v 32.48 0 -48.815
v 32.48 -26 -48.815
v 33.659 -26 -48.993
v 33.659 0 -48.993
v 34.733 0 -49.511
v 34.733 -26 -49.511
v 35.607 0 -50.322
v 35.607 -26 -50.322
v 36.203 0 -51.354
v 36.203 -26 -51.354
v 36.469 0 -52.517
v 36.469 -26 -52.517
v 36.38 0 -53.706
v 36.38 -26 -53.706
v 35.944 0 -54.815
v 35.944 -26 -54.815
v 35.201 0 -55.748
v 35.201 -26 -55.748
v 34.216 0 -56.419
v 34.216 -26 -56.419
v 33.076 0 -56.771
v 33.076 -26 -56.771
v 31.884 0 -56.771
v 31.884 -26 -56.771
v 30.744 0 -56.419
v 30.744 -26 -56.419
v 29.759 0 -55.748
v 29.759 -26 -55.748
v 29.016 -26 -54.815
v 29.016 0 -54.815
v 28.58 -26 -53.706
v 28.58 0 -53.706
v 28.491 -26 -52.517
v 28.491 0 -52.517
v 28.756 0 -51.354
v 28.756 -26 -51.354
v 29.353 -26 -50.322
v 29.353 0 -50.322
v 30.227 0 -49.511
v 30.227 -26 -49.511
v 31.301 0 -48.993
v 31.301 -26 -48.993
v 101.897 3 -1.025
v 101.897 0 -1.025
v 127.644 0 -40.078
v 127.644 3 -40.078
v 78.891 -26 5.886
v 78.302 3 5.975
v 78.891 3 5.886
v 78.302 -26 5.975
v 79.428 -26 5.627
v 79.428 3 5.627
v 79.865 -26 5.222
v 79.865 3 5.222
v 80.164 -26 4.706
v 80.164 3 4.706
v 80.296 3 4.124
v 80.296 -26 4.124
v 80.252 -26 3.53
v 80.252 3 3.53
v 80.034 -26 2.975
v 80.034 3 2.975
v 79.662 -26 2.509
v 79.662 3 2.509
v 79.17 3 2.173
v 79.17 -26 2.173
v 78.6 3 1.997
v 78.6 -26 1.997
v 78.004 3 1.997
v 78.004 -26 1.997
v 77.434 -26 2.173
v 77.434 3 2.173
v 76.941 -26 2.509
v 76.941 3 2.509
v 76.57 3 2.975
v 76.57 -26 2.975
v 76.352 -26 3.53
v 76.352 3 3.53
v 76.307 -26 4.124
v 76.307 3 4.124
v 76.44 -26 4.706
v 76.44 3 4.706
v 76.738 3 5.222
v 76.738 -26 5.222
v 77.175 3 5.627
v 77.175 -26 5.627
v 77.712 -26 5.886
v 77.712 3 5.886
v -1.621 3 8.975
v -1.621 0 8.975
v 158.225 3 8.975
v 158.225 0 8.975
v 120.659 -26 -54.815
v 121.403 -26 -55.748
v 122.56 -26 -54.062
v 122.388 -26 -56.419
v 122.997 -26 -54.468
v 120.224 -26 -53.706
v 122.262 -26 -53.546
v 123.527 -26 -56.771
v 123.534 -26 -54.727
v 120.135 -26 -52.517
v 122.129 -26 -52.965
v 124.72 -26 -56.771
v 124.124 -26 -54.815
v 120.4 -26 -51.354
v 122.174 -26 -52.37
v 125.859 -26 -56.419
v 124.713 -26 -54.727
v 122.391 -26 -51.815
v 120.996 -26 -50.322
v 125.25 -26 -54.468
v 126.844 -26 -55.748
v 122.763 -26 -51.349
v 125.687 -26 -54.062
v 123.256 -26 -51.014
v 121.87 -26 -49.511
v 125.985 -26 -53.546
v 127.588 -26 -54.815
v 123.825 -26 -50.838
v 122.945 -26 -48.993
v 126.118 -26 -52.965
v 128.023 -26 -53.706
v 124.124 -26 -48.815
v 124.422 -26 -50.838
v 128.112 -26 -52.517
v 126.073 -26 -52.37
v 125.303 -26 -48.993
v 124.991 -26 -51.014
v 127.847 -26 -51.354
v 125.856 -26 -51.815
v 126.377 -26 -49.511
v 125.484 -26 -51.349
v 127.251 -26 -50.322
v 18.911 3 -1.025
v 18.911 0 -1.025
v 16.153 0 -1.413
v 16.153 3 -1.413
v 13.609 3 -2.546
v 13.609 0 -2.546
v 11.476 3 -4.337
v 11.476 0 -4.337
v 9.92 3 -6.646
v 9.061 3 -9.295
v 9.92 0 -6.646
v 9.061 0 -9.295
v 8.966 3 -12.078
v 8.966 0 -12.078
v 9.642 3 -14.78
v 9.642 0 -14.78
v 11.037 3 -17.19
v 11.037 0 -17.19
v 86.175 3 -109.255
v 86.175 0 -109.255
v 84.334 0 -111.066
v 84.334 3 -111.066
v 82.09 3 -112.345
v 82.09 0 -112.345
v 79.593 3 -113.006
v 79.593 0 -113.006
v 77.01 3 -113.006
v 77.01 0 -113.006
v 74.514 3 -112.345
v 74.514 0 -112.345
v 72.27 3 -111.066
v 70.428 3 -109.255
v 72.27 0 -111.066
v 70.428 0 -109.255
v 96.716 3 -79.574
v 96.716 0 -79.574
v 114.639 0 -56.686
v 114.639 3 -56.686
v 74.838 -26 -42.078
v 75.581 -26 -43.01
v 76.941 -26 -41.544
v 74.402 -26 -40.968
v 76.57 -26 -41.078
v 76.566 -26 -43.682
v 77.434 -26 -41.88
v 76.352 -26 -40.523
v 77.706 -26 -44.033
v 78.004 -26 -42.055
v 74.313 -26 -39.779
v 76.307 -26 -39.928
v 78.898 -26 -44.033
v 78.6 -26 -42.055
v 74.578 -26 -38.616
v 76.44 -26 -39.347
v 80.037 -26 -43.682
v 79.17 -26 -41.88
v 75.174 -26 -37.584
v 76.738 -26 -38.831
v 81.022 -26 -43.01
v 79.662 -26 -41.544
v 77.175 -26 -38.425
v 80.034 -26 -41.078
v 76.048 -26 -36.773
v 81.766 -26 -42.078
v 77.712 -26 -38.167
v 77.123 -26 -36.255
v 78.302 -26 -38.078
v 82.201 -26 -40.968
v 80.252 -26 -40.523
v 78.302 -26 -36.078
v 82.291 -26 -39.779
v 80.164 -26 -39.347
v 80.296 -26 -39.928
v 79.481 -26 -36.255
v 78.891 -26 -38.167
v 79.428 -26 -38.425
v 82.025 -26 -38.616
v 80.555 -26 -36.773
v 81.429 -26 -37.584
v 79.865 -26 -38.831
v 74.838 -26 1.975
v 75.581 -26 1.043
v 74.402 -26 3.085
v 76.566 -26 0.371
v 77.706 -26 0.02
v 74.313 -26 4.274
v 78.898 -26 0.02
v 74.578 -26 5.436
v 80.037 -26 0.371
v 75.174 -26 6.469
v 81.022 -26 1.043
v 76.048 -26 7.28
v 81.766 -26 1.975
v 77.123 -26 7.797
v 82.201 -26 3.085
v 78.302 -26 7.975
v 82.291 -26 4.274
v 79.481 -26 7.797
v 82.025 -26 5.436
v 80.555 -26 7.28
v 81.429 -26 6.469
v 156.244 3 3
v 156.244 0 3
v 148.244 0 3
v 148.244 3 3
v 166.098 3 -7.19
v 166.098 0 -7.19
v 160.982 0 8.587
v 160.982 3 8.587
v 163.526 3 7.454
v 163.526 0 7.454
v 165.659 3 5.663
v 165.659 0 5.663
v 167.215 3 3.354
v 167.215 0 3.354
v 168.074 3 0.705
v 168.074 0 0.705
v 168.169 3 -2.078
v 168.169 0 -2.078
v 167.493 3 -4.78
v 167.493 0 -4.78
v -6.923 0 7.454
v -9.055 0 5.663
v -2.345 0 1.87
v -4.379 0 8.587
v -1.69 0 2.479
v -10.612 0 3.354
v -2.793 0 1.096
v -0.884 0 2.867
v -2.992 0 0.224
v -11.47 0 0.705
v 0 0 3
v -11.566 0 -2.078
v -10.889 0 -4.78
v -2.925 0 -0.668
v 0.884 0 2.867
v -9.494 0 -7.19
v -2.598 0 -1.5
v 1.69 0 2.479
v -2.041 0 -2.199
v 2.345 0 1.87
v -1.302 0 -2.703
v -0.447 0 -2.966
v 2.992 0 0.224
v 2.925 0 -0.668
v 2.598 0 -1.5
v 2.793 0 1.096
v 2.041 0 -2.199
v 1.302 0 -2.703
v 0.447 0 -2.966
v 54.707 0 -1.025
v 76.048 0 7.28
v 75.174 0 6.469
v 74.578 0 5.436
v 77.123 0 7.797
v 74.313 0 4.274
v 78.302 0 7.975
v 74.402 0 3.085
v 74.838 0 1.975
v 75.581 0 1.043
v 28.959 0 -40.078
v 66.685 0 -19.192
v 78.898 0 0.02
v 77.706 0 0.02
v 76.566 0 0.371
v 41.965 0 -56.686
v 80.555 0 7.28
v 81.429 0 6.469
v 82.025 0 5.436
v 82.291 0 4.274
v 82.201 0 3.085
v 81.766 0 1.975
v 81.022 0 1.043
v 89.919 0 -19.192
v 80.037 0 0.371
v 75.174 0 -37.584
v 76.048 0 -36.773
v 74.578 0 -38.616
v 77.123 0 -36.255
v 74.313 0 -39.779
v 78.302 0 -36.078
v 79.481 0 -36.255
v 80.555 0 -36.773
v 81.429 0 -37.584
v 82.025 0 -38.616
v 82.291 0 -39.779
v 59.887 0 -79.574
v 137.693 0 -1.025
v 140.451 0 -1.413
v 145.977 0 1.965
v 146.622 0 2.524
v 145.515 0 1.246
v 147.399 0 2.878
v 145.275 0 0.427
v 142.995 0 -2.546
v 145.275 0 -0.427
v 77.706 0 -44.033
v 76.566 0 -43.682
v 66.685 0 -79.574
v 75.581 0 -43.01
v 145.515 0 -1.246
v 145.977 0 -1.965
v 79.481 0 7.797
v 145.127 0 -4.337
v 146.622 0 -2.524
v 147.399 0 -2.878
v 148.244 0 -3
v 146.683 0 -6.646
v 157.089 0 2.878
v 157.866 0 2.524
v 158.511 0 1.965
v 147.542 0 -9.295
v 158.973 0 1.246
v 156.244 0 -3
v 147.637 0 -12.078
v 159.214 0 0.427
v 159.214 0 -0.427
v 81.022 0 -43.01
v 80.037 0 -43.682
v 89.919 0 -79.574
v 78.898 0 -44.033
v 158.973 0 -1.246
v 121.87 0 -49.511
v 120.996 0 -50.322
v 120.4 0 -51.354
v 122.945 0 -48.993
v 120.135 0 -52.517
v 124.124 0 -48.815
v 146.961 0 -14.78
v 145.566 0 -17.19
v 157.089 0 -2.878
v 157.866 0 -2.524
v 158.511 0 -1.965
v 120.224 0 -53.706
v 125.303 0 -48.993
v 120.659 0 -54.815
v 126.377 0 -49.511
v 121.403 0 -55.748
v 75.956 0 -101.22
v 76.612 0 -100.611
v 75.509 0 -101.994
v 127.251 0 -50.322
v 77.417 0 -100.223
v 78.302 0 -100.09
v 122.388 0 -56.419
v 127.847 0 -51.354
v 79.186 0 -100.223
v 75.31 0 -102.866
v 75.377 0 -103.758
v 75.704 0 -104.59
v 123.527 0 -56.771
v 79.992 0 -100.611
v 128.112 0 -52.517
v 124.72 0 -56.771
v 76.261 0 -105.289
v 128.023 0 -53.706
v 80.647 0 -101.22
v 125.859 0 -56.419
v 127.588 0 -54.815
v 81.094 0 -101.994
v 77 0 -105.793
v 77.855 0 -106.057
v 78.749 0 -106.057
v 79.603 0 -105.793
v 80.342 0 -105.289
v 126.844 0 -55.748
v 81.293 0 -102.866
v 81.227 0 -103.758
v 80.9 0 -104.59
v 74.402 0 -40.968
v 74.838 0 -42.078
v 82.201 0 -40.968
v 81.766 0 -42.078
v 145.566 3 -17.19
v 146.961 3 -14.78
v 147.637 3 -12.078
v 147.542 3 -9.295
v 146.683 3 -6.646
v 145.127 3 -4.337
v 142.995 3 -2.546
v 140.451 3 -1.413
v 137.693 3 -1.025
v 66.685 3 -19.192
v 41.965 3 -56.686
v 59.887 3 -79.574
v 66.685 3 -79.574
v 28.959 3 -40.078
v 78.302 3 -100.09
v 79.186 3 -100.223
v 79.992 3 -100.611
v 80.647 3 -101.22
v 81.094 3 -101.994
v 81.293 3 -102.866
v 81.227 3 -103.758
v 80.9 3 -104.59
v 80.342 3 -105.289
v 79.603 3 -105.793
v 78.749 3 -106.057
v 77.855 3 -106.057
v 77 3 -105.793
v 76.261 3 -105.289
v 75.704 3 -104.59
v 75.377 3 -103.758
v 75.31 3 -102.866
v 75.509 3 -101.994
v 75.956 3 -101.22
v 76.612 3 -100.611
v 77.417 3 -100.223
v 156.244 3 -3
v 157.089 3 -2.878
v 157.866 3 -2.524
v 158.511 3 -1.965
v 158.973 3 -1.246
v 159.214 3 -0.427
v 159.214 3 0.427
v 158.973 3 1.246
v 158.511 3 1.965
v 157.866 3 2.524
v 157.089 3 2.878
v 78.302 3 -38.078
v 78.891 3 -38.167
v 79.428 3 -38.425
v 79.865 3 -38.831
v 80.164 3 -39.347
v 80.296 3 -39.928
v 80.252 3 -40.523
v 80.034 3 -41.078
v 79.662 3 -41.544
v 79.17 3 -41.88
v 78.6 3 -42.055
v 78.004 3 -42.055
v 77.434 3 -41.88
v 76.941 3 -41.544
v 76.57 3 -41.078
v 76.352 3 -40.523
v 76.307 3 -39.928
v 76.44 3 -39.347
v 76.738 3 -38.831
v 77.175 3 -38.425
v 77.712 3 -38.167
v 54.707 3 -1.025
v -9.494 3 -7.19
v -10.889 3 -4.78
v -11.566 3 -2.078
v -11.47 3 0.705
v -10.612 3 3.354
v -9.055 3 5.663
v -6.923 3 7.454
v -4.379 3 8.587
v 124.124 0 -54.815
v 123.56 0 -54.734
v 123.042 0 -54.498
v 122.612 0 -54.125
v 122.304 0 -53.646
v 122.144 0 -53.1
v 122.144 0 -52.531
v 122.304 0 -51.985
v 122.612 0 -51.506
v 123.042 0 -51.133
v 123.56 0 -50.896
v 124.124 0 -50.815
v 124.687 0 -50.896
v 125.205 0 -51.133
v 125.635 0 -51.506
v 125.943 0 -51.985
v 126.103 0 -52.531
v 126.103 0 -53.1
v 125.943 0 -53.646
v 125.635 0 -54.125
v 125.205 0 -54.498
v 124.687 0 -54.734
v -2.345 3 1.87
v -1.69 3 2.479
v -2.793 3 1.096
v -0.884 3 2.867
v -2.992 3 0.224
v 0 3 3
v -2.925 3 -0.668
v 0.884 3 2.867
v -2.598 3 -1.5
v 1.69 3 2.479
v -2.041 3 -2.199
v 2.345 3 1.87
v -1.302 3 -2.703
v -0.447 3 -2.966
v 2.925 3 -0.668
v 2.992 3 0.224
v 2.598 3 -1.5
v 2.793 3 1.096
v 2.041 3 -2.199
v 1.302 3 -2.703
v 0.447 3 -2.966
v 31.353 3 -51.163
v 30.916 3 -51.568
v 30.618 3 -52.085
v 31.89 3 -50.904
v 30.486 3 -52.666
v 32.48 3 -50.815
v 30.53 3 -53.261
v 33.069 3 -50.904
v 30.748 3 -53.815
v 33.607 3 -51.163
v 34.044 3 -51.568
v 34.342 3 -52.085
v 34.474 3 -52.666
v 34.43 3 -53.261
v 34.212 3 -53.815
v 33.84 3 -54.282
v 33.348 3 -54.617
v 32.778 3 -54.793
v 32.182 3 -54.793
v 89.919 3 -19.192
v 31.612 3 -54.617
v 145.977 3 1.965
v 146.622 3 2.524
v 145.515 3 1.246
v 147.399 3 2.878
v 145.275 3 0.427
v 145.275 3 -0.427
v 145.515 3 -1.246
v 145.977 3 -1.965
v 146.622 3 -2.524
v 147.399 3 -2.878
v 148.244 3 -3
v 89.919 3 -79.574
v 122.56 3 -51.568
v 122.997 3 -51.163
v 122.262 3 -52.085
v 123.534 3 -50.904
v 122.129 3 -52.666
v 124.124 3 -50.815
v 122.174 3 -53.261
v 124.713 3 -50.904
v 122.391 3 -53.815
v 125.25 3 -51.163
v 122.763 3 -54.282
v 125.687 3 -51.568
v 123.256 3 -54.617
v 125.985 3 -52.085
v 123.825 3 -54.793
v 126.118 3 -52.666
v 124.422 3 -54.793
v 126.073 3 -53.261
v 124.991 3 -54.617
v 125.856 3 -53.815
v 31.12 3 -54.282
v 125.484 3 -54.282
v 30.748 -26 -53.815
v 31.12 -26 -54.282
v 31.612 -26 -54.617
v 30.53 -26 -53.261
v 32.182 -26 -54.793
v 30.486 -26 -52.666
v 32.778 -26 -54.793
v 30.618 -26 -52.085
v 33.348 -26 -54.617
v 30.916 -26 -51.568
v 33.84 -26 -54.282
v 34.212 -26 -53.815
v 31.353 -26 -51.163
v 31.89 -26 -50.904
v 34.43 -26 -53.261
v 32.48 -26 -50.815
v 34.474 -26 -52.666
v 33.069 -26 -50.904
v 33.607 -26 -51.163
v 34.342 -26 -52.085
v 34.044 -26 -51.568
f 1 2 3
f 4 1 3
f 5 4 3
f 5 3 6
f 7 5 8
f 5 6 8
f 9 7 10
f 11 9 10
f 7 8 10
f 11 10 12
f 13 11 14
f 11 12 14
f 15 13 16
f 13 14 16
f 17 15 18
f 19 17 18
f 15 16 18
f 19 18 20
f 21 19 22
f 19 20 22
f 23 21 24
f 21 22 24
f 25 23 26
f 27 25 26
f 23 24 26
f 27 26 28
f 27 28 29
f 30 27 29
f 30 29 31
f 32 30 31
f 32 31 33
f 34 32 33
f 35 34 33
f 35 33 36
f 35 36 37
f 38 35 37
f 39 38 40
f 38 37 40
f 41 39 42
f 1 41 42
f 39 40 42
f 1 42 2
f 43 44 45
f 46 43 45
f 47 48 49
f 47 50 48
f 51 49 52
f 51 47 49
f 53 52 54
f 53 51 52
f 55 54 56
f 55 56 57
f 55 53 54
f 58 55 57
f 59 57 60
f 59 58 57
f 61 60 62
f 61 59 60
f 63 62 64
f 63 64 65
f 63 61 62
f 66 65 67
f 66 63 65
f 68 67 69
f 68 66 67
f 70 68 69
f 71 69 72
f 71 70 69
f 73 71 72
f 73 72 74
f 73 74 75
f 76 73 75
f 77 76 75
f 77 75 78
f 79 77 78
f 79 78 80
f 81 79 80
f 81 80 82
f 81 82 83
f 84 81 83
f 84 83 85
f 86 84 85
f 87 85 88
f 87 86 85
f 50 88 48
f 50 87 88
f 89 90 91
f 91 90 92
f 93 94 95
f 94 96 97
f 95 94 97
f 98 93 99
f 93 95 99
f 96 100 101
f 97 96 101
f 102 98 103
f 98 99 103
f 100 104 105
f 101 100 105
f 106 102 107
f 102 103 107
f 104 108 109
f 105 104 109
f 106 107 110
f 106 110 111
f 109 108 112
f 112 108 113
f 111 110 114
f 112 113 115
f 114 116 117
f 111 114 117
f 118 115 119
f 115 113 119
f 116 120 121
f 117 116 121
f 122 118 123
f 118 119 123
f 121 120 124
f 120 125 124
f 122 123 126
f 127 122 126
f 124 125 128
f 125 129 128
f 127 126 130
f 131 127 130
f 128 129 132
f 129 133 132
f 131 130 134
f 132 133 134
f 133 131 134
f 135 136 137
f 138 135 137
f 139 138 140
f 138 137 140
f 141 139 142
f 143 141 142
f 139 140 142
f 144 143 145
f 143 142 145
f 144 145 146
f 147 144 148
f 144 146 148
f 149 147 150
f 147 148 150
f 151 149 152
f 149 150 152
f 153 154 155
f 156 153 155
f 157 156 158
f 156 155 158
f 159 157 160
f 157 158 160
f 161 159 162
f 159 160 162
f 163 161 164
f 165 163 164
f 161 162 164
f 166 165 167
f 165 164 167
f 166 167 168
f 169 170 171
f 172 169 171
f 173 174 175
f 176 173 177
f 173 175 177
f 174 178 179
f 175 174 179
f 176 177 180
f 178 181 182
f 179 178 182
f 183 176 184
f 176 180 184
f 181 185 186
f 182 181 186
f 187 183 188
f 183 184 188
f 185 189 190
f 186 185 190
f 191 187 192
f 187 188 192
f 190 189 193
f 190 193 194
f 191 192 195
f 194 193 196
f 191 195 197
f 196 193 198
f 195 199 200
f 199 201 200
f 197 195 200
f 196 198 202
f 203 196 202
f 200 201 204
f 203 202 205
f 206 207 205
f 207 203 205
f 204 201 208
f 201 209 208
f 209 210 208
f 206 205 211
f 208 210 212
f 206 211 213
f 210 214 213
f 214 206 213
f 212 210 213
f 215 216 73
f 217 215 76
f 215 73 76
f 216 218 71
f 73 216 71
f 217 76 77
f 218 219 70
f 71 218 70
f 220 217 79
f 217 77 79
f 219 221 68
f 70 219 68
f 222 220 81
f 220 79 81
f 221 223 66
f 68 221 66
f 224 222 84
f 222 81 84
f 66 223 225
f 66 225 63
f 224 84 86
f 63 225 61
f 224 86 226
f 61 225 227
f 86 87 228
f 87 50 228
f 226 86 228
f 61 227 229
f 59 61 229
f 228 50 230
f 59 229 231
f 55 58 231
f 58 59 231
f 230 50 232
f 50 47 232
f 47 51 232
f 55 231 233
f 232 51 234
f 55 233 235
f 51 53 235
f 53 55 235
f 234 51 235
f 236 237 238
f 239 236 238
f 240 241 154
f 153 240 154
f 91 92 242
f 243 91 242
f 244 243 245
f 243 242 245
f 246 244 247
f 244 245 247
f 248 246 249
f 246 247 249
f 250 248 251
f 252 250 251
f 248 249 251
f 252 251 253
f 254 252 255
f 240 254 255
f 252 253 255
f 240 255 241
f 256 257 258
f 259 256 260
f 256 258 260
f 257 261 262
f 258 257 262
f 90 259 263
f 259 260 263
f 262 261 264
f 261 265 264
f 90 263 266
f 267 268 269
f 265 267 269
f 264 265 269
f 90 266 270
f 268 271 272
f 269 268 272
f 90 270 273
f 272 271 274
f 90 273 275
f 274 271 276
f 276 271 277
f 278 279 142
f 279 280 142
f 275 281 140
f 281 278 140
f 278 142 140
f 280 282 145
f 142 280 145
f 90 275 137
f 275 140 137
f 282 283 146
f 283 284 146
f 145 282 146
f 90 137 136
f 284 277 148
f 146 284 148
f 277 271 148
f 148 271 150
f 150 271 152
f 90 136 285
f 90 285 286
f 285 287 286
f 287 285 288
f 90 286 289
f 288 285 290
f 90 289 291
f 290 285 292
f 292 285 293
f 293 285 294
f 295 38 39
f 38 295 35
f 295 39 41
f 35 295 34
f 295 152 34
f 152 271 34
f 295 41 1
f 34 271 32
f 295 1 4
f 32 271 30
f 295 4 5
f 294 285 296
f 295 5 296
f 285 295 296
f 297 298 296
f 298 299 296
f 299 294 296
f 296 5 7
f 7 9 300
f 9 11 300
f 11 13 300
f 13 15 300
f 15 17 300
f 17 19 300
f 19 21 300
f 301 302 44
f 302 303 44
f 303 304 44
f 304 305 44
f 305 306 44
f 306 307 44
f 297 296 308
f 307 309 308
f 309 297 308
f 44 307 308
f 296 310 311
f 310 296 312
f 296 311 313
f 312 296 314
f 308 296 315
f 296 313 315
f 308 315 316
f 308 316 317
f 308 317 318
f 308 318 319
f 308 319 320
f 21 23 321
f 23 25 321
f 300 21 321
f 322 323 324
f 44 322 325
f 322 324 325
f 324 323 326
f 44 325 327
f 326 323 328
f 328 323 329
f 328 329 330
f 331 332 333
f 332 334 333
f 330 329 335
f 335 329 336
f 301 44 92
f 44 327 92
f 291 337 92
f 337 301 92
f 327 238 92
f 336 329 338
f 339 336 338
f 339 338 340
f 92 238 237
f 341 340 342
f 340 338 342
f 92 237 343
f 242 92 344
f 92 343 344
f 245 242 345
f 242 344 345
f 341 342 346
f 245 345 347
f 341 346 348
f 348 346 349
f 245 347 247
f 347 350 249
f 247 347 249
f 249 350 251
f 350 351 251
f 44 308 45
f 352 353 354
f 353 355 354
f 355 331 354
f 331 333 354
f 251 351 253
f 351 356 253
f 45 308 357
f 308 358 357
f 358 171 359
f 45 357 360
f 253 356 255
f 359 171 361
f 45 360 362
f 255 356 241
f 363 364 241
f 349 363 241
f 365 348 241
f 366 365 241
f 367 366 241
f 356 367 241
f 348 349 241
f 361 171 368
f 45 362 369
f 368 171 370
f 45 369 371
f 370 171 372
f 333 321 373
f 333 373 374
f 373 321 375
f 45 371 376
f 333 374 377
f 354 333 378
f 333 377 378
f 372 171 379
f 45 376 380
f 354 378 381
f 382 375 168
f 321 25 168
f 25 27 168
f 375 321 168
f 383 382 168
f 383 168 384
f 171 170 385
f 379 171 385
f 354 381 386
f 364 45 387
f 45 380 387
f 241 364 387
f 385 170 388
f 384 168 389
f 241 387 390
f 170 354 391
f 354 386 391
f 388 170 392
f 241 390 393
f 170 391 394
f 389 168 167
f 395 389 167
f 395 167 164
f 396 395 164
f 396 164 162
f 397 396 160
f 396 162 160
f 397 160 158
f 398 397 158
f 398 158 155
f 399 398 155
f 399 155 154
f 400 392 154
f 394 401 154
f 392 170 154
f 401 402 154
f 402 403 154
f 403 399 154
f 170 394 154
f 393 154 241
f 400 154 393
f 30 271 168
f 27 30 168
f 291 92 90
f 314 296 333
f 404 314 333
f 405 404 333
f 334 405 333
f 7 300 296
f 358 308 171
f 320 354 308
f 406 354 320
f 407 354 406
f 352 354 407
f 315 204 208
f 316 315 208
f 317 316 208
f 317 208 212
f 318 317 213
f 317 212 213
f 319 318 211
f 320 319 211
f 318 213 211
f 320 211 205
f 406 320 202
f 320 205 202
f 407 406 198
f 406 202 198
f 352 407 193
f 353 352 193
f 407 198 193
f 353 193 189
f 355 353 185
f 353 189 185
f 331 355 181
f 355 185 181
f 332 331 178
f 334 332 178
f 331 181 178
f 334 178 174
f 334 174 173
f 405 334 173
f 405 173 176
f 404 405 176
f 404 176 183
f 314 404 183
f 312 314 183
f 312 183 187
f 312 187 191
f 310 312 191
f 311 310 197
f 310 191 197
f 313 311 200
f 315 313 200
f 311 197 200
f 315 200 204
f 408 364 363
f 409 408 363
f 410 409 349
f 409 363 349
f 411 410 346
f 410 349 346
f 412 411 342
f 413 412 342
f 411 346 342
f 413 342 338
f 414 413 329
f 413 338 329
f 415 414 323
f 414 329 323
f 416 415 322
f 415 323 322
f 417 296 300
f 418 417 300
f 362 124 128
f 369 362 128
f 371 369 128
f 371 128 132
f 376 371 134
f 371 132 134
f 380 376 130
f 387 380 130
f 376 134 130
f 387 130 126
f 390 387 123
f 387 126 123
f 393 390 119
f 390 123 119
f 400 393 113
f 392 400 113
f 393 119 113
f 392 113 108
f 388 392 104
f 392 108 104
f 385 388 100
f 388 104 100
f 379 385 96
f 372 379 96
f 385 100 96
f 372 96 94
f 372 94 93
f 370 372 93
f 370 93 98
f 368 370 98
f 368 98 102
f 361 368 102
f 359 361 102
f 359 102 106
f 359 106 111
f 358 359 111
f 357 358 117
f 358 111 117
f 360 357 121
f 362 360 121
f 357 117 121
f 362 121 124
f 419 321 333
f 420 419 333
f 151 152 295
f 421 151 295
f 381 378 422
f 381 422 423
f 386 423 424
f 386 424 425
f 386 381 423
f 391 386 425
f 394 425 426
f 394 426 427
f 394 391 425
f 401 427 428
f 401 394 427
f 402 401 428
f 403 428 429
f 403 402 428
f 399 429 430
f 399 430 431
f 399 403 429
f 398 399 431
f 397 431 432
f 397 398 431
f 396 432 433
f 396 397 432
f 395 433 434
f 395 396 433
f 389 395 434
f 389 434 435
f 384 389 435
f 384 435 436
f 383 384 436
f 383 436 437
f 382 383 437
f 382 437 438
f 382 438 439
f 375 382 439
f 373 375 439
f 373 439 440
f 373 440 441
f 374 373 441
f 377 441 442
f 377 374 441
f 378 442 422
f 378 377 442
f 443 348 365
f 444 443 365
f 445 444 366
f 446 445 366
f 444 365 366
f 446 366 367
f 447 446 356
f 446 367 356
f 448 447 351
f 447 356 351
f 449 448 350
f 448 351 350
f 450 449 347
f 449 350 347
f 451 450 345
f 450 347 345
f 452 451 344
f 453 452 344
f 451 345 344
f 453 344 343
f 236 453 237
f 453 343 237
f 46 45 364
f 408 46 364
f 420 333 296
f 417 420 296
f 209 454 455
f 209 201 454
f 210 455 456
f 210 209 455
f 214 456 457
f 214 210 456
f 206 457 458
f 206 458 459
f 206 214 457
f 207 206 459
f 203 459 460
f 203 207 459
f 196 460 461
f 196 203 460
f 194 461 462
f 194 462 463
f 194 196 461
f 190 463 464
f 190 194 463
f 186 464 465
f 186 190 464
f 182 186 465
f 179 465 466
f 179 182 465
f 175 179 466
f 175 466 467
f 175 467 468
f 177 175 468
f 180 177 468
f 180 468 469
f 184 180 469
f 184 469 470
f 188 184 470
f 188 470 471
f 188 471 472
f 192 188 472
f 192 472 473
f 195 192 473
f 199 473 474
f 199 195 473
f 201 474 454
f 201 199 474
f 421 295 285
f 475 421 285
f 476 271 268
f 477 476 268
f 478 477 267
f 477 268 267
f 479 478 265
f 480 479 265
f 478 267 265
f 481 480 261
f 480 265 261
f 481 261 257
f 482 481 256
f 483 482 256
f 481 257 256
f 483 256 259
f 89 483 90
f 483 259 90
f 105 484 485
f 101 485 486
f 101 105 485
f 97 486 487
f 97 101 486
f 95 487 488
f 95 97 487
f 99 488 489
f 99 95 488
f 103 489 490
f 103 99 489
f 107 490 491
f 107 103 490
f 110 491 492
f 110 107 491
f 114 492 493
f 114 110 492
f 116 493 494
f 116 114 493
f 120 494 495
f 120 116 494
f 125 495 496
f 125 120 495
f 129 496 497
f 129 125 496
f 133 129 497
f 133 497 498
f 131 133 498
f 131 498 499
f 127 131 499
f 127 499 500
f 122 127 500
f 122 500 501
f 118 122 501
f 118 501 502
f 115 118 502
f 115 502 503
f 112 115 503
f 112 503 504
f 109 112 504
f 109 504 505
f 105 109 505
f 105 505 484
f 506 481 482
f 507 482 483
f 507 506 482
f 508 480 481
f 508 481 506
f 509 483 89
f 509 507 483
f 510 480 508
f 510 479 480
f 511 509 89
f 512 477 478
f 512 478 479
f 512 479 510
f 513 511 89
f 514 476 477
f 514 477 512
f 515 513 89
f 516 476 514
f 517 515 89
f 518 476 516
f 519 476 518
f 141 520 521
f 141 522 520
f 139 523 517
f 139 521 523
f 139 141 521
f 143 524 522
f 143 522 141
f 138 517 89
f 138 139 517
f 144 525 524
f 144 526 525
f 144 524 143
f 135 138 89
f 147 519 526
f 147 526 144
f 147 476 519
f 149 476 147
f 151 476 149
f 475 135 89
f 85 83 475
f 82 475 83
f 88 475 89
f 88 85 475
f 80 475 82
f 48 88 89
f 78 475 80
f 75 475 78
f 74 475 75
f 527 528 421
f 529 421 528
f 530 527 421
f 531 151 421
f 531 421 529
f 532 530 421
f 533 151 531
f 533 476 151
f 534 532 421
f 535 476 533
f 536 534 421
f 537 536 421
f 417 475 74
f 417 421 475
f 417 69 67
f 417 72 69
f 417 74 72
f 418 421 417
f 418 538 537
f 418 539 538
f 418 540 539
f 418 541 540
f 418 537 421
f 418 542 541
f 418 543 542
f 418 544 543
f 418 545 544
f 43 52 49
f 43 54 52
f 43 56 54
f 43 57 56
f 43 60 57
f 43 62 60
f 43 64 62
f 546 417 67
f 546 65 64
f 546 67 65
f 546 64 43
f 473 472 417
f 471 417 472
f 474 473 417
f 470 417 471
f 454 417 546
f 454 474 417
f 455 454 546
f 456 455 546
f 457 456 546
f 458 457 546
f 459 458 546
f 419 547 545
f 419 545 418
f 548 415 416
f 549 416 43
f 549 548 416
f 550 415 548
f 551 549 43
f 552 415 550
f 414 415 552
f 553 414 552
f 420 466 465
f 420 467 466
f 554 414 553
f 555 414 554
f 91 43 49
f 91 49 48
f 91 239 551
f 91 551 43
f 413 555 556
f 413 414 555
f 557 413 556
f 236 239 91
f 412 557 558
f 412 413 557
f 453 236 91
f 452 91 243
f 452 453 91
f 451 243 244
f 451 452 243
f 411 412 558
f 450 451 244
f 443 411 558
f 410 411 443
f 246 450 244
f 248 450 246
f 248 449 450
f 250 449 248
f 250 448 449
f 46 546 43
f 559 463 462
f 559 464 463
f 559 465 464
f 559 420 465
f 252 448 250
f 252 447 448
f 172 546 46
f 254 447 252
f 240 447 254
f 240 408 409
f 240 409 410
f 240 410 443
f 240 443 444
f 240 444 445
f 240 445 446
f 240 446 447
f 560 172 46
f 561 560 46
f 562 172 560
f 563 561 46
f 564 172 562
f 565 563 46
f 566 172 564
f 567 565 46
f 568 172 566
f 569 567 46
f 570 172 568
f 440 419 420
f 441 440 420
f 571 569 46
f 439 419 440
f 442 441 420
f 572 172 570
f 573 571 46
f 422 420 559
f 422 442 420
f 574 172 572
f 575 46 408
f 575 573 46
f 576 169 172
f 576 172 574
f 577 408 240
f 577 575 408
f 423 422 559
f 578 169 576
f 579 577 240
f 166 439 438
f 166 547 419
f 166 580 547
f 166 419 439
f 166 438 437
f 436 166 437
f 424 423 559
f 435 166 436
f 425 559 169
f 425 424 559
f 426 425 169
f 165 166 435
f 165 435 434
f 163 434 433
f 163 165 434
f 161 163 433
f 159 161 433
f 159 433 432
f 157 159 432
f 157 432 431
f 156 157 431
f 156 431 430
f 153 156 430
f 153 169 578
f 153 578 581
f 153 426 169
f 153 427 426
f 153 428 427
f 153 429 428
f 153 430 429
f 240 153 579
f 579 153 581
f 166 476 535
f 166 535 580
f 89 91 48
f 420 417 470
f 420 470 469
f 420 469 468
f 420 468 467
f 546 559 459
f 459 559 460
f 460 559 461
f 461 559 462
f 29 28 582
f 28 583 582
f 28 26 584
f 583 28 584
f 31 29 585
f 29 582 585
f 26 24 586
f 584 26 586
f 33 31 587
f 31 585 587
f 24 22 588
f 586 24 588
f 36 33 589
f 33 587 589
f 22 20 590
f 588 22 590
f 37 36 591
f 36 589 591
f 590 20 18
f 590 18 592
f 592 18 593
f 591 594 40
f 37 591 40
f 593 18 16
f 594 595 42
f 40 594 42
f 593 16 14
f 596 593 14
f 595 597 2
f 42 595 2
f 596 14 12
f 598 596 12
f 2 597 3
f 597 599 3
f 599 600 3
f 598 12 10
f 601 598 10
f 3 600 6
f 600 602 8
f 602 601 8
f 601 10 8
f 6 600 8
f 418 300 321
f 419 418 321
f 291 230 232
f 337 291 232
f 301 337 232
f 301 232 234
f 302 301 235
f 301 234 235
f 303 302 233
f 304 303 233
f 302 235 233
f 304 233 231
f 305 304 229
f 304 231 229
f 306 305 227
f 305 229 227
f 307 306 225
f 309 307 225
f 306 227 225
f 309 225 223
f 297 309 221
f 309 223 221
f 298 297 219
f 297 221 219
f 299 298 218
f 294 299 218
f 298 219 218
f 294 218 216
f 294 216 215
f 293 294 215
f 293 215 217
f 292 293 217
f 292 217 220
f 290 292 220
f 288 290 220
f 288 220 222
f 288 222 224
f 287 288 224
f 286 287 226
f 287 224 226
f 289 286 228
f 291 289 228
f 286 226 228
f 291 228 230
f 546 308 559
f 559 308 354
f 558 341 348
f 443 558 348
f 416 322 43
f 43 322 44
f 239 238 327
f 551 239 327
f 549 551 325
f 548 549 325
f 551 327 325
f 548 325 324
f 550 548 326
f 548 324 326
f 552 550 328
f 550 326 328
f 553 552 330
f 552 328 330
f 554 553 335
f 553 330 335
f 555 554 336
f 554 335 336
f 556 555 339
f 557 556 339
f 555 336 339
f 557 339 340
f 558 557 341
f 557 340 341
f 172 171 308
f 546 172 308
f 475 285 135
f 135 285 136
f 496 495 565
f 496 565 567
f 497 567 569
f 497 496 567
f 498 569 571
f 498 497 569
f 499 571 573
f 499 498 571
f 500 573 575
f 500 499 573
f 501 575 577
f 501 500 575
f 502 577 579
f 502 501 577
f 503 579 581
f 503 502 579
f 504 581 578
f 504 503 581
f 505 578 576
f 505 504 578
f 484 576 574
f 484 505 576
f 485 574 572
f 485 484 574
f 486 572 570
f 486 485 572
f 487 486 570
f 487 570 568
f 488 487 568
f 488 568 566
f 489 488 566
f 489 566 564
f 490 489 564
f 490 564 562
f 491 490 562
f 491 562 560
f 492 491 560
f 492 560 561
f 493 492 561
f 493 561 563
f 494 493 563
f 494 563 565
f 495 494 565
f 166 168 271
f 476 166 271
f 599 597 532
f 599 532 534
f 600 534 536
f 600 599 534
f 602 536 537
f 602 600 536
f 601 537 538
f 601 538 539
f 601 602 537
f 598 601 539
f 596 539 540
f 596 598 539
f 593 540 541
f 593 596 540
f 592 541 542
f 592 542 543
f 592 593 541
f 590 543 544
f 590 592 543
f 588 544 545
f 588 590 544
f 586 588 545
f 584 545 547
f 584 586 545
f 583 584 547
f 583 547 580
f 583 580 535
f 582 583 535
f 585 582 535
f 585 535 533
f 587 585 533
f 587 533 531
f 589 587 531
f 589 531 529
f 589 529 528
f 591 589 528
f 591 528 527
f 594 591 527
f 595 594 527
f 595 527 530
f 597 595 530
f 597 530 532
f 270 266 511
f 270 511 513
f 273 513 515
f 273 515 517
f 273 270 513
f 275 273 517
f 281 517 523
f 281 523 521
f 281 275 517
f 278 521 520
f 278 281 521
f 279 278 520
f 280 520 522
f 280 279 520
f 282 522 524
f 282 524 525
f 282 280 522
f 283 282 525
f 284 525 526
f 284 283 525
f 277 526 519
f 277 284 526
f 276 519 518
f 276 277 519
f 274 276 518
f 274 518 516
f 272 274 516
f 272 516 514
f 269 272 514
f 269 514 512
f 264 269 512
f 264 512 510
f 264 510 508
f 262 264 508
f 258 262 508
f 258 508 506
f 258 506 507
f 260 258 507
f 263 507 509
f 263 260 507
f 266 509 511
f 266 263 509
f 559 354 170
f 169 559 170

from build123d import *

# Parameters (mm, degrees)
SKETCH1_R           = 2
SKETCH1_R_2         = 3
BOSS_EXTRUDE1_DEPTH = 3
BOSS_EXTRUDE2_START = -26
SKETCH1_4_R         = 4
SKETCH1_4_R_2       = 2
BOSS_EXTRUDE2_DEPTH = 26


with BuildPart() as part:
    # Sketch1 → Boss-Extrude1 (new body)
    with BuildSketch(Plane(origin=(0, 0, 0), x_dir=(1, 0, 0), z_dir=(0, 1, 0))):
        with BuildLine():
            ThreePointArc((158.22466969, -8.975009298), (167.21501885, -3.353778756), (166.098002955, 7.190266308))
            Line((166.098002955, 7.190266308), (86.175088728, 109.255409789))
            ThreePointArc((86.175088728, 109.255409789), (78.301755463, 113.090134184), (70.428422197, 109.255409789))
            Line((70.428422197, 109.255409789), (-9.49449203, 7.190266308))
            ThreePointArc((-9.49449203, 7.190266308), (-10.611507924, -3.353778756), (-1.621158764, -8.975009298))
            Line((-1.621158764, -8.975009298), (78.301755463, -8.975009298))
            Line((78.301755463, -8.975009298), (158.22466969, -8.975009298))
        make_face()
        with Locations((78.301755463, 40.077672933)):
            Circle(SKETCH1_R, mode=Mode.SUBTRACT)
        Circle(SKETCH1_R_2, mode=Mode.SUBTRACT)
        with BuildLine():
            ThreePointArc((18.910520844, 1.024990702), (9.920171683, 6.646221244), (11.037187578, 17.190266308))
            Line((11.037187578, 17.190266308), (28.959351543, 40.077672933))
            Line((28.959351543, 40.077672933), (54.70682481, 1.024990702))
            Line((54.70682481, 1.024990702), (18.910520844, 1.024990702))
        make_face(mode=Mode.SUBTRACT)
        Polygon((59.887035288, 79.573711202), (66.6846286, 79.573711202), (66.6846286, 19.192418643), (41.964871323, 56.686304577), align=None, mode=Mode.SUBTRACT)
        with BuildLine():
            Line((156.244075902, -3), (148.244075902, -3))
            ThreePointArc((148.244075902, -3), (145.244075902, 0), (148.244075902, 3))
            Line((148.244075902, 3), (156.244075902, 3))
            ThreePointArc((156.244075902, 3), (159.244075902, 0), (156.244075902, -3))
        make_face(mode=Mode.SUBTRACT)
        with BuildLine():
            Line((137.692990082, 1.024990702), (101.896686116, 1.024990702))
            Line((101.896686116, 1.024990702), (127.644159383, 40.077672933))
            Line((127.644159383, 40.077672933), (145.566323348, 17.190266308))
            ThreePointArc((145.566323348, 17.190266308), (146.683339242, 6.646221244), (137.692990082, 1.024990702))
        make_face(mode=Mode.SUBTRACT)
        Polygon((114.638639603, 56.686304577), (89.918882326, 19.192418643), (89.918882326, 79.573711202), (96.716475638, 79.573711202), align=None, mode=Mode.SUBTRACT)
        with Locations((78.301755463, 103.090134184)):
            Circle(SKETCH1_R_2, mode=Mode.SUBTRACT)
        with Locations((78.301755463, -3.975009298)):
            Circle(SKETCH1_R, mode=Mode.SUBTRACT)
        with Locations((32.47996742, 52.815460811)):
            Circle(SKETCH1_R, mode=Mode.SUBTRACT)
        with Locations((124.123543506, 52.815460811)):
            Circle(SKETCH1_R, mode=Mode.SUBTRACT)
    extrude(amount=BOSS_EXTRUDE1_DEPTH)

    # Sketch1<4> → Boss-Extrude2 (add)
    # profile 1 of 4: a face of its own
    with BuildSketch(Plane(origin=(0, 0, 0), x_dir=(1, 0, 0), z_dir=(0, 1, 0)).offset(BOSS_EXTRUDE2_START)):
        with Locations((32.47996742, 52.815460811)):
            Circle(SKETCH1_4_R)
        with Locations((32.47996742, 52.815460811)):
            Circle(SKETCH1_4_R_2, mode=Mode.SUBTRACT)
    # profile 2 of 4: a face of its own
    with BuildSketch(Plane(origin=(0, 0, 0), x_dir=(1, 0, 0), z_dir=(0, 1, 0)).offset(BOSS_EXTRUDE2_START)):
        with Locations((124.123543506, 52.815460811)):
            Circle(SKETCH1_4_R)
        with Locations((124.123543506, 52.815460811)):
            Circle(SKETCH1_4_R_2, mode=Mode.SUBTRACT)
    # profile 3 of 4: a face of its own
    with BuildSketch(Plane(origin=(0, 0, 0), x_dir=(1, 0, 0), z_dir=(0, 1, 0)).offset(BOSS_EXTRUDE2_START)):
        with Locations((78.301755463, 40.077672933)):
            Circle(SKETCH1_4_R)
        with Locations((78.301755463, 40.077672933)):
            Circle(SKETCH1_4_R_2, mode=Mode.SUBTRACT)
    # profile 4 of 4: a face of its own
    with BuildSketch(Plane(origin=(0, 0, 0), x_dir=(1, 0, 0), z_dir=(0, 1, 0)).offset(BOSS_EXTRUDE2_START)):
        with Locations((78.301755463, -3.975009298)):
            Circle(SKETCH1_4_R)
        with Locations((78.301755463, -3.975009298)):
            Circle(SKETCH1_4_R_2, mode=Mode.SUBTRACT)
    extrude(amount=BOSS_EXTRUDE2_DEPTH)


solid = part.part
